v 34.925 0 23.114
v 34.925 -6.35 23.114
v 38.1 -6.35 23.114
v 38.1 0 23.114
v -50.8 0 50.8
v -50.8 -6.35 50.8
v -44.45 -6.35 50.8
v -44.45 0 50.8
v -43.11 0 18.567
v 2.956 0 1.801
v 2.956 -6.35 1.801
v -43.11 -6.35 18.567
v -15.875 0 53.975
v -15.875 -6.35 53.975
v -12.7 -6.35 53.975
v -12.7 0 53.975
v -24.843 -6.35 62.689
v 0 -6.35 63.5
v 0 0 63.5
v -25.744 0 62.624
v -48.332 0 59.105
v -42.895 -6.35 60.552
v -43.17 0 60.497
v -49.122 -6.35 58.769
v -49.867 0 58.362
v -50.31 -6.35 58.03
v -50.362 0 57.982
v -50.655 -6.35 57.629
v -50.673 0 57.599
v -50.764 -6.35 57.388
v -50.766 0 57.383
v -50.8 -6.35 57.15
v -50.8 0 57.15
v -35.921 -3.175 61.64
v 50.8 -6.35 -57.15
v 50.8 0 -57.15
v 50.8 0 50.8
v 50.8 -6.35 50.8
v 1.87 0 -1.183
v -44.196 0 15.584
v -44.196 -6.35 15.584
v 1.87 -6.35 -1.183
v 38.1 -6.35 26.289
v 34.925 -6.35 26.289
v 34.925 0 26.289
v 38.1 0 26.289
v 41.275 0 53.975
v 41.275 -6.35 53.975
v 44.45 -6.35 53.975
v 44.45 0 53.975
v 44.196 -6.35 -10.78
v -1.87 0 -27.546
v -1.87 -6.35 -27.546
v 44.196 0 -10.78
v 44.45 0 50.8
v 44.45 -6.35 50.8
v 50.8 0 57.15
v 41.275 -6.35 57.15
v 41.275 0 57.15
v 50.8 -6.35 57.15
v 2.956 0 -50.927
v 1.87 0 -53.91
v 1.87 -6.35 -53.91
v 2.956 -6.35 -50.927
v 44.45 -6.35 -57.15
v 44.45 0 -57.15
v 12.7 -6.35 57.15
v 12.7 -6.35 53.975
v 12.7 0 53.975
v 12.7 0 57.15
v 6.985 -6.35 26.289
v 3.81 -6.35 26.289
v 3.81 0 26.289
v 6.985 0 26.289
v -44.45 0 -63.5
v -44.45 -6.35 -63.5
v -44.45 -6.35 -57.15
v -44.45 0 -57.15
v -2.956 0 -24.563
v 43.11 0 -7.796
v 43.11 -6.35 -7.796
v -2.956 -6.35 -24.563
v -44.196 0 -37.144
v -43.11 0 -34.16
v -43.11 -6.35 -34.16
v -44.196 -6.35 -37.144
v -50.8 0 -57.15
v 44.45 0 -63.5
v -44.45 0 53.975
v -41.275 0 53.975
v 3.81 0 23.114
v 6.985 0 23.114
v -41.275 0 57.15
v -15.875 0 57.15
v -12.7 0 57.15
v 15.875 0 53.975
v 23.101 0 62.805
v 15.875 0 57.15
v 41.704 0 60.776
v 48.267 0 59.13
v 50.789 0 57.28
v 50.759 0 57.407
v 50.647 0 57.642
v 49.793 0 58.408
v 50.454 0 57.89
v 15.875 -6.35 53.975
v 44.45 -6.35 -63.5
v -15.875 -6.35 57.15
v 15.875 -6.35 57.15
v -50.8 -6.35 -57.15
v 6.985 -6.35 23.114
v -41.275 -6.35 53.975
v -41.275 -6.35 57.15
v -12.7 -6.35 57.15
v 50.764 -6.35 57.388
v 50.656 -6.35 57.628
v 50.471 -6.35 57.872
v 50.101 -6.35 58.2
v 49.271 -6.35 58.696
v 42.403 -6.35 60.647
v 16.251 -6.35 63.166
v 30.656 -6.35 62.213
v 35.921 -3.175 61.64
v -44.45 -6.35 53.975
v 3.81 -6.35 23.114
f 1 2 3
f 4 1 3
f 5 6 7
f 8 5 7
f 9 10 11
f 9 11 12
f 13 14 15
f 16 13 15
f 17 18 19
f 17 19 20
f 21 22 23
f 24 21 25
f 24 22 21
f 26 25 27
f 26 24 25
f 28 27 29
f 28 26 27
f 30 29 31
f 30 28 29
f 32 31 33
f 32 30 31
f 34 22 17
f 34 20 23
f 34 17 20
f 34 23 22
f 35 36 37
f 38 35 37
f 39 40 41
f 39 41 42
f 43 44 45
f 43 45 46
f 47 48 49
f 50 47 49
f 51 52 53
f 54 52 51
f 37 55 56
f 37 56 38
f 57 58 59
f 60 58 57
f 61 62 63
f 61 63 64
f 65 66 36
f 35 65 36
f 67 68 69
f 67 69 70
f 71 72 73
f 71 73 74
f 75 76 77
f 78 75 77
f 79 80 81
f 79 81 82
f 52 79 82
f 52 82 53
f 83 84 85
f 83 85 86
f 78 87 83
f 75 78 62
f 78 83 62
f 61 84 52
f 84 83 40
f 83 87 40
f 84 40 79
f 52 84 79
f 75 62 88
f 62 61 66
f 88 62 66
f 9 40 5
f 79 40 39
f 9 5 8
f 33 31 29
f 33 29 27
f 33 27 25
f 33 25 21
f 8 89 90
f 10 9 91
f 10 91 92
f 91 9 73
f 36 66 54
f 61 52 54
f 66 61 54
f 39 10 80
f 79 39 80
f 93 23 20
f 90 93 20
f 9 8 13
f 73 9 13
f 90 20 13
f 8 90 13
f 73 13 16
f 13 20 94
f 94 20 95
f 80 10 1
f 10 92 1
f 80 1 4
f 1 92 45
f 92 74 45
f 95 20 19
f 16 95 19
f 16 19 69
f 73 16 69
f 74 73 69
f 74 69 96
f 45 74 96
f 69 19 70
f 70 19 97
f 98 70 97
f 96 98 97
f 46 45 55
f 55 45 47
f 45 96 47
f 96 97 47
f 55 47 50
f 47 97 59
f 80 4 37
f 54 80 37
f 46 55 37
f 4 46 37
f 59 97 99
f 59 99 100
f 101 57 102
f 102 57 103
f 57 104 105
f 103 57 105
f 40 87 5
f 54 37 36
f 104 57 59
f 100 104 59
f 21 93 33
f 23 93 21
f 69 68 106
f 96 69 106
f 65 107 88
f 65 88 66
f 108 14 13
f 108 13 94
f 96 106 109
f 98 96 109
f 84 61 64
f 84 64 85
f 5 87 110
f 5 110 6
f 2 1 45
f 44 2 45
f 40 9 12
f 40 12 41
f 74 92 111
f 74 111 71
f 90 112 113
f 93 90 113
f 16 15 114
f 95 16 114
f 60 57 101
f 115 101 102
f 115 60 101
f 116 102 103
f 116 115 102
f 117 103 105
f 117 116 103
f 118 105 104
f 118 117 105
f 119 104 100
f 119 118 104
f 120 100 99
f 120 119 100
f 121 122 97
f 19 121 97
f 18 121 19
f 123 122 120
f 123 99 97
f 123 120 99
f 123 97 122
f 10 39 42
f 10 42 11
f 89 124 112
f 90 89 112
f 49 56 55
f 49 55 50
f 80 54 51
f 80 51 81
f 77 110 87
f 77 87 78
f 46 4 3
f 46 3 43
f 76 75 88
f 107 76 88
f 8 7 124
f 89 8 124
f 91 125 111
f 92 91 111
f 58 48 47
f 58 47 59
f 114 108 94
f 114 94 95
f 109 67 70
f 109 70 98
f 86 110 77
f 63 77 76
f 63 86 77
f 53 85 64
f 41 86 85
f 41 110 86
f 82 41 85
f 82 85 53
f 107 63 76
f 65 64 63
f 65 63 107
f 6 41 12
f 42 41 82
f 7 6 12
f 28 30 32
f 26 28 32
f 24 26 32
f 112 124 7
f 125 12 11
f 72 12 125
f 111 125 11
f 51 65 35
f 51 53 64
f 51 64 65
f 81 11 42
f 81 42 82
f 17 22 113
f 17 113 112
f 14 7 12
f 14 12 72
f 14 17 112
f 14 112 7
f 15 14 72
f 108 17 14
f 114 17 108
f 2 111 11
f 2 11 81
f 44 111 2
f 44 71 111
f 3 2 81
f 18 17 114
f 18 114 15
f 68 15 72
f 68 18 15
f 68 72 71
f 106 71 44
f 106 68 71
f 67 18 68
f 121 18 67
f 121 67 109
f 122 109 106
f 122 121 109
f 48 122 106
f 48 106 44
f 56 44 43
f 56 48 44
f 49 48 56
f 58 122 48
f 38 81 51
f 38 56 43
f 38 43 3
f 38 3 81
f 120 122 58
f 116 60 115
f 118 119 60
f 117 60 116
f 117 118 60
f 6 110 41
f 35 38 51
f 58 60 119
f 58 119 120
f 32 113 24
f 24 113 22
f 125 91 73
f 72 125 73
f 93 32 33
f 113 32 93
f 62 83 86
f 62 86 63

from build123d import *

# Parameters (mm, degrees)
F0_W      = 101.6
F0_H      = 127
F1_DEPTH  = 6.35
F2_W      = 6.35
F2_H      = 6.35
F3_DEPTH  = 6.351
F5_DEPTH  = 6.351
F6_W      = 3.175
F6_H      = 3.175
F7_DEPTH  = 6.3510001
F9_DEPTH  = 34.798
F11_DEPTH = 25.4
F13_DEPTH = 25.4


with BuildPart() as f1:
    # F0 (on Front) → F1 (new body)
    with BuildSketch(Plane.XZ):
        Rectangle(F0_W, F0_H)
    extrude(amount=F1_DEPTH)

    # F2 (on face) → F3 (cut, through all)
    with BuildSketch(Plane.XZ.offset(6.35)):
        with Locations((-47.625, 53.975)):
            Rectangle(F2_W, F2_H)
        with Locations((47.625, 53.975)):
            Rectangle(F2_W, F2_H)
        with Locations((47.625, -60.325)):
            Rectangle(F2_W, F2_H)
        with Locations((-47.625, -60.325)):
            Rectangle(F2_W, F2_H)
    extrude(amount=-F3_DEPTH, mode=Mode.SUBTRACT)

    # F4 (on face) → F5 (cut, through all)
    with BuildSketch(Plane.XZ.offset(6.35)):
        with BuildLine():
            Line((-50.8, 63.5), (-50.8, 57.15))
            add(Edge.make_bspline(
                [(-3.402e-07, 63.5), (-50.8, 63.4999999575), (-50.8, 57.15)],
                knots=[4.7123889871, 4.7123889871, 4.7123889871, 6.2831853072, 6.2831853072, 6.2831853072], degree=2, weights=[1, 0.7071067836, 1]))
            Line((-3.402e-07, 63.5), (-50.8, 63.5))
        make_face()
        with BuildLine():
            add(Edge.make_bspline(
                [(50.8, 57.15), (50.8, 63.5000000425), (-3.402e-07, 63.5)],
                knots=[3.1415926536, 3.1415926536, 3.1415926536, 4.7123889871, 4.7123889871, 4.7123889871], degree=2, weights=[1, 0.7071067788, 1]))
            Line((50.8, 57.15), (50.8, 63.5))
            Line((50.8, 63.5), (-3.402e-07, 63.5))
        make_face()
    extrude(amount=-F5_DEPTH, mode=Mode.SUBTRACT)

    # F6 (on face) → F7 (cut, through all)
    with BuildSketch(Plane.XZ.offset(6.35)):
        with Locations((-42.8625, 55.5625)):
            Rectangle(F6_W, F6_H)
        with Locations((-14.2875, 55.5625)):
            Rectangle(F6_W, F6_H)
        with Locations((14.2875, 55.5625)):
            Rectangle(F6_W, F6_H)
        with Locations((42.8625, 55.5625)):
            Rectangle(F6_W, F6_H)
        with Locations((36.5125, 24.7015)):
            Rectangle(F6_W, F6_H)
        with Locations((5.3975, 24.7015)):
            Rectangle(F6_W, F6_H)
    extrude(amount=-F7_DEPTH, mode=Mode.SUBTRACT)

    # F8 (on Front) → F9 (cut)
    with BuildSketch(Plane.XZ):
        Polygon((2.9555256112, 1.8009109067), (-43.1100860449, 18.5674223729), (-44.196, 15.5838983019), (1.8696116562, -1.1826131642), align=None)
    extrude(amount=F9_DEPTH, mode=Mode.SUBTRACT)

    # F10 (on Front) → F11 (cut)
    with BuildSketch(Plane.XZ):
        Polygon((43.1100860449, -7.7964003764), (-2.9555256112, -24.5629118425), (-1.8696116562, -27.5464359135), (44.196, -10.7799244474), align=None)
    extrude(amount=F11_DEPTH, mode=Mode.SUBTRACT)

    # F12 (on Front) → F13 (cut)
    with BuildSketch(Plane.XZ):
        Polygon((2.9555256112, -50.9267345918), (-43.1100860449, -34.1602231257), (-44.196, -37.1437471967), (1.8696116562, -53.9102586628), align=None)
    extrude(amount=F13_DEPTH, mode=Mode.SUBTRACT)


solid = f1.part
